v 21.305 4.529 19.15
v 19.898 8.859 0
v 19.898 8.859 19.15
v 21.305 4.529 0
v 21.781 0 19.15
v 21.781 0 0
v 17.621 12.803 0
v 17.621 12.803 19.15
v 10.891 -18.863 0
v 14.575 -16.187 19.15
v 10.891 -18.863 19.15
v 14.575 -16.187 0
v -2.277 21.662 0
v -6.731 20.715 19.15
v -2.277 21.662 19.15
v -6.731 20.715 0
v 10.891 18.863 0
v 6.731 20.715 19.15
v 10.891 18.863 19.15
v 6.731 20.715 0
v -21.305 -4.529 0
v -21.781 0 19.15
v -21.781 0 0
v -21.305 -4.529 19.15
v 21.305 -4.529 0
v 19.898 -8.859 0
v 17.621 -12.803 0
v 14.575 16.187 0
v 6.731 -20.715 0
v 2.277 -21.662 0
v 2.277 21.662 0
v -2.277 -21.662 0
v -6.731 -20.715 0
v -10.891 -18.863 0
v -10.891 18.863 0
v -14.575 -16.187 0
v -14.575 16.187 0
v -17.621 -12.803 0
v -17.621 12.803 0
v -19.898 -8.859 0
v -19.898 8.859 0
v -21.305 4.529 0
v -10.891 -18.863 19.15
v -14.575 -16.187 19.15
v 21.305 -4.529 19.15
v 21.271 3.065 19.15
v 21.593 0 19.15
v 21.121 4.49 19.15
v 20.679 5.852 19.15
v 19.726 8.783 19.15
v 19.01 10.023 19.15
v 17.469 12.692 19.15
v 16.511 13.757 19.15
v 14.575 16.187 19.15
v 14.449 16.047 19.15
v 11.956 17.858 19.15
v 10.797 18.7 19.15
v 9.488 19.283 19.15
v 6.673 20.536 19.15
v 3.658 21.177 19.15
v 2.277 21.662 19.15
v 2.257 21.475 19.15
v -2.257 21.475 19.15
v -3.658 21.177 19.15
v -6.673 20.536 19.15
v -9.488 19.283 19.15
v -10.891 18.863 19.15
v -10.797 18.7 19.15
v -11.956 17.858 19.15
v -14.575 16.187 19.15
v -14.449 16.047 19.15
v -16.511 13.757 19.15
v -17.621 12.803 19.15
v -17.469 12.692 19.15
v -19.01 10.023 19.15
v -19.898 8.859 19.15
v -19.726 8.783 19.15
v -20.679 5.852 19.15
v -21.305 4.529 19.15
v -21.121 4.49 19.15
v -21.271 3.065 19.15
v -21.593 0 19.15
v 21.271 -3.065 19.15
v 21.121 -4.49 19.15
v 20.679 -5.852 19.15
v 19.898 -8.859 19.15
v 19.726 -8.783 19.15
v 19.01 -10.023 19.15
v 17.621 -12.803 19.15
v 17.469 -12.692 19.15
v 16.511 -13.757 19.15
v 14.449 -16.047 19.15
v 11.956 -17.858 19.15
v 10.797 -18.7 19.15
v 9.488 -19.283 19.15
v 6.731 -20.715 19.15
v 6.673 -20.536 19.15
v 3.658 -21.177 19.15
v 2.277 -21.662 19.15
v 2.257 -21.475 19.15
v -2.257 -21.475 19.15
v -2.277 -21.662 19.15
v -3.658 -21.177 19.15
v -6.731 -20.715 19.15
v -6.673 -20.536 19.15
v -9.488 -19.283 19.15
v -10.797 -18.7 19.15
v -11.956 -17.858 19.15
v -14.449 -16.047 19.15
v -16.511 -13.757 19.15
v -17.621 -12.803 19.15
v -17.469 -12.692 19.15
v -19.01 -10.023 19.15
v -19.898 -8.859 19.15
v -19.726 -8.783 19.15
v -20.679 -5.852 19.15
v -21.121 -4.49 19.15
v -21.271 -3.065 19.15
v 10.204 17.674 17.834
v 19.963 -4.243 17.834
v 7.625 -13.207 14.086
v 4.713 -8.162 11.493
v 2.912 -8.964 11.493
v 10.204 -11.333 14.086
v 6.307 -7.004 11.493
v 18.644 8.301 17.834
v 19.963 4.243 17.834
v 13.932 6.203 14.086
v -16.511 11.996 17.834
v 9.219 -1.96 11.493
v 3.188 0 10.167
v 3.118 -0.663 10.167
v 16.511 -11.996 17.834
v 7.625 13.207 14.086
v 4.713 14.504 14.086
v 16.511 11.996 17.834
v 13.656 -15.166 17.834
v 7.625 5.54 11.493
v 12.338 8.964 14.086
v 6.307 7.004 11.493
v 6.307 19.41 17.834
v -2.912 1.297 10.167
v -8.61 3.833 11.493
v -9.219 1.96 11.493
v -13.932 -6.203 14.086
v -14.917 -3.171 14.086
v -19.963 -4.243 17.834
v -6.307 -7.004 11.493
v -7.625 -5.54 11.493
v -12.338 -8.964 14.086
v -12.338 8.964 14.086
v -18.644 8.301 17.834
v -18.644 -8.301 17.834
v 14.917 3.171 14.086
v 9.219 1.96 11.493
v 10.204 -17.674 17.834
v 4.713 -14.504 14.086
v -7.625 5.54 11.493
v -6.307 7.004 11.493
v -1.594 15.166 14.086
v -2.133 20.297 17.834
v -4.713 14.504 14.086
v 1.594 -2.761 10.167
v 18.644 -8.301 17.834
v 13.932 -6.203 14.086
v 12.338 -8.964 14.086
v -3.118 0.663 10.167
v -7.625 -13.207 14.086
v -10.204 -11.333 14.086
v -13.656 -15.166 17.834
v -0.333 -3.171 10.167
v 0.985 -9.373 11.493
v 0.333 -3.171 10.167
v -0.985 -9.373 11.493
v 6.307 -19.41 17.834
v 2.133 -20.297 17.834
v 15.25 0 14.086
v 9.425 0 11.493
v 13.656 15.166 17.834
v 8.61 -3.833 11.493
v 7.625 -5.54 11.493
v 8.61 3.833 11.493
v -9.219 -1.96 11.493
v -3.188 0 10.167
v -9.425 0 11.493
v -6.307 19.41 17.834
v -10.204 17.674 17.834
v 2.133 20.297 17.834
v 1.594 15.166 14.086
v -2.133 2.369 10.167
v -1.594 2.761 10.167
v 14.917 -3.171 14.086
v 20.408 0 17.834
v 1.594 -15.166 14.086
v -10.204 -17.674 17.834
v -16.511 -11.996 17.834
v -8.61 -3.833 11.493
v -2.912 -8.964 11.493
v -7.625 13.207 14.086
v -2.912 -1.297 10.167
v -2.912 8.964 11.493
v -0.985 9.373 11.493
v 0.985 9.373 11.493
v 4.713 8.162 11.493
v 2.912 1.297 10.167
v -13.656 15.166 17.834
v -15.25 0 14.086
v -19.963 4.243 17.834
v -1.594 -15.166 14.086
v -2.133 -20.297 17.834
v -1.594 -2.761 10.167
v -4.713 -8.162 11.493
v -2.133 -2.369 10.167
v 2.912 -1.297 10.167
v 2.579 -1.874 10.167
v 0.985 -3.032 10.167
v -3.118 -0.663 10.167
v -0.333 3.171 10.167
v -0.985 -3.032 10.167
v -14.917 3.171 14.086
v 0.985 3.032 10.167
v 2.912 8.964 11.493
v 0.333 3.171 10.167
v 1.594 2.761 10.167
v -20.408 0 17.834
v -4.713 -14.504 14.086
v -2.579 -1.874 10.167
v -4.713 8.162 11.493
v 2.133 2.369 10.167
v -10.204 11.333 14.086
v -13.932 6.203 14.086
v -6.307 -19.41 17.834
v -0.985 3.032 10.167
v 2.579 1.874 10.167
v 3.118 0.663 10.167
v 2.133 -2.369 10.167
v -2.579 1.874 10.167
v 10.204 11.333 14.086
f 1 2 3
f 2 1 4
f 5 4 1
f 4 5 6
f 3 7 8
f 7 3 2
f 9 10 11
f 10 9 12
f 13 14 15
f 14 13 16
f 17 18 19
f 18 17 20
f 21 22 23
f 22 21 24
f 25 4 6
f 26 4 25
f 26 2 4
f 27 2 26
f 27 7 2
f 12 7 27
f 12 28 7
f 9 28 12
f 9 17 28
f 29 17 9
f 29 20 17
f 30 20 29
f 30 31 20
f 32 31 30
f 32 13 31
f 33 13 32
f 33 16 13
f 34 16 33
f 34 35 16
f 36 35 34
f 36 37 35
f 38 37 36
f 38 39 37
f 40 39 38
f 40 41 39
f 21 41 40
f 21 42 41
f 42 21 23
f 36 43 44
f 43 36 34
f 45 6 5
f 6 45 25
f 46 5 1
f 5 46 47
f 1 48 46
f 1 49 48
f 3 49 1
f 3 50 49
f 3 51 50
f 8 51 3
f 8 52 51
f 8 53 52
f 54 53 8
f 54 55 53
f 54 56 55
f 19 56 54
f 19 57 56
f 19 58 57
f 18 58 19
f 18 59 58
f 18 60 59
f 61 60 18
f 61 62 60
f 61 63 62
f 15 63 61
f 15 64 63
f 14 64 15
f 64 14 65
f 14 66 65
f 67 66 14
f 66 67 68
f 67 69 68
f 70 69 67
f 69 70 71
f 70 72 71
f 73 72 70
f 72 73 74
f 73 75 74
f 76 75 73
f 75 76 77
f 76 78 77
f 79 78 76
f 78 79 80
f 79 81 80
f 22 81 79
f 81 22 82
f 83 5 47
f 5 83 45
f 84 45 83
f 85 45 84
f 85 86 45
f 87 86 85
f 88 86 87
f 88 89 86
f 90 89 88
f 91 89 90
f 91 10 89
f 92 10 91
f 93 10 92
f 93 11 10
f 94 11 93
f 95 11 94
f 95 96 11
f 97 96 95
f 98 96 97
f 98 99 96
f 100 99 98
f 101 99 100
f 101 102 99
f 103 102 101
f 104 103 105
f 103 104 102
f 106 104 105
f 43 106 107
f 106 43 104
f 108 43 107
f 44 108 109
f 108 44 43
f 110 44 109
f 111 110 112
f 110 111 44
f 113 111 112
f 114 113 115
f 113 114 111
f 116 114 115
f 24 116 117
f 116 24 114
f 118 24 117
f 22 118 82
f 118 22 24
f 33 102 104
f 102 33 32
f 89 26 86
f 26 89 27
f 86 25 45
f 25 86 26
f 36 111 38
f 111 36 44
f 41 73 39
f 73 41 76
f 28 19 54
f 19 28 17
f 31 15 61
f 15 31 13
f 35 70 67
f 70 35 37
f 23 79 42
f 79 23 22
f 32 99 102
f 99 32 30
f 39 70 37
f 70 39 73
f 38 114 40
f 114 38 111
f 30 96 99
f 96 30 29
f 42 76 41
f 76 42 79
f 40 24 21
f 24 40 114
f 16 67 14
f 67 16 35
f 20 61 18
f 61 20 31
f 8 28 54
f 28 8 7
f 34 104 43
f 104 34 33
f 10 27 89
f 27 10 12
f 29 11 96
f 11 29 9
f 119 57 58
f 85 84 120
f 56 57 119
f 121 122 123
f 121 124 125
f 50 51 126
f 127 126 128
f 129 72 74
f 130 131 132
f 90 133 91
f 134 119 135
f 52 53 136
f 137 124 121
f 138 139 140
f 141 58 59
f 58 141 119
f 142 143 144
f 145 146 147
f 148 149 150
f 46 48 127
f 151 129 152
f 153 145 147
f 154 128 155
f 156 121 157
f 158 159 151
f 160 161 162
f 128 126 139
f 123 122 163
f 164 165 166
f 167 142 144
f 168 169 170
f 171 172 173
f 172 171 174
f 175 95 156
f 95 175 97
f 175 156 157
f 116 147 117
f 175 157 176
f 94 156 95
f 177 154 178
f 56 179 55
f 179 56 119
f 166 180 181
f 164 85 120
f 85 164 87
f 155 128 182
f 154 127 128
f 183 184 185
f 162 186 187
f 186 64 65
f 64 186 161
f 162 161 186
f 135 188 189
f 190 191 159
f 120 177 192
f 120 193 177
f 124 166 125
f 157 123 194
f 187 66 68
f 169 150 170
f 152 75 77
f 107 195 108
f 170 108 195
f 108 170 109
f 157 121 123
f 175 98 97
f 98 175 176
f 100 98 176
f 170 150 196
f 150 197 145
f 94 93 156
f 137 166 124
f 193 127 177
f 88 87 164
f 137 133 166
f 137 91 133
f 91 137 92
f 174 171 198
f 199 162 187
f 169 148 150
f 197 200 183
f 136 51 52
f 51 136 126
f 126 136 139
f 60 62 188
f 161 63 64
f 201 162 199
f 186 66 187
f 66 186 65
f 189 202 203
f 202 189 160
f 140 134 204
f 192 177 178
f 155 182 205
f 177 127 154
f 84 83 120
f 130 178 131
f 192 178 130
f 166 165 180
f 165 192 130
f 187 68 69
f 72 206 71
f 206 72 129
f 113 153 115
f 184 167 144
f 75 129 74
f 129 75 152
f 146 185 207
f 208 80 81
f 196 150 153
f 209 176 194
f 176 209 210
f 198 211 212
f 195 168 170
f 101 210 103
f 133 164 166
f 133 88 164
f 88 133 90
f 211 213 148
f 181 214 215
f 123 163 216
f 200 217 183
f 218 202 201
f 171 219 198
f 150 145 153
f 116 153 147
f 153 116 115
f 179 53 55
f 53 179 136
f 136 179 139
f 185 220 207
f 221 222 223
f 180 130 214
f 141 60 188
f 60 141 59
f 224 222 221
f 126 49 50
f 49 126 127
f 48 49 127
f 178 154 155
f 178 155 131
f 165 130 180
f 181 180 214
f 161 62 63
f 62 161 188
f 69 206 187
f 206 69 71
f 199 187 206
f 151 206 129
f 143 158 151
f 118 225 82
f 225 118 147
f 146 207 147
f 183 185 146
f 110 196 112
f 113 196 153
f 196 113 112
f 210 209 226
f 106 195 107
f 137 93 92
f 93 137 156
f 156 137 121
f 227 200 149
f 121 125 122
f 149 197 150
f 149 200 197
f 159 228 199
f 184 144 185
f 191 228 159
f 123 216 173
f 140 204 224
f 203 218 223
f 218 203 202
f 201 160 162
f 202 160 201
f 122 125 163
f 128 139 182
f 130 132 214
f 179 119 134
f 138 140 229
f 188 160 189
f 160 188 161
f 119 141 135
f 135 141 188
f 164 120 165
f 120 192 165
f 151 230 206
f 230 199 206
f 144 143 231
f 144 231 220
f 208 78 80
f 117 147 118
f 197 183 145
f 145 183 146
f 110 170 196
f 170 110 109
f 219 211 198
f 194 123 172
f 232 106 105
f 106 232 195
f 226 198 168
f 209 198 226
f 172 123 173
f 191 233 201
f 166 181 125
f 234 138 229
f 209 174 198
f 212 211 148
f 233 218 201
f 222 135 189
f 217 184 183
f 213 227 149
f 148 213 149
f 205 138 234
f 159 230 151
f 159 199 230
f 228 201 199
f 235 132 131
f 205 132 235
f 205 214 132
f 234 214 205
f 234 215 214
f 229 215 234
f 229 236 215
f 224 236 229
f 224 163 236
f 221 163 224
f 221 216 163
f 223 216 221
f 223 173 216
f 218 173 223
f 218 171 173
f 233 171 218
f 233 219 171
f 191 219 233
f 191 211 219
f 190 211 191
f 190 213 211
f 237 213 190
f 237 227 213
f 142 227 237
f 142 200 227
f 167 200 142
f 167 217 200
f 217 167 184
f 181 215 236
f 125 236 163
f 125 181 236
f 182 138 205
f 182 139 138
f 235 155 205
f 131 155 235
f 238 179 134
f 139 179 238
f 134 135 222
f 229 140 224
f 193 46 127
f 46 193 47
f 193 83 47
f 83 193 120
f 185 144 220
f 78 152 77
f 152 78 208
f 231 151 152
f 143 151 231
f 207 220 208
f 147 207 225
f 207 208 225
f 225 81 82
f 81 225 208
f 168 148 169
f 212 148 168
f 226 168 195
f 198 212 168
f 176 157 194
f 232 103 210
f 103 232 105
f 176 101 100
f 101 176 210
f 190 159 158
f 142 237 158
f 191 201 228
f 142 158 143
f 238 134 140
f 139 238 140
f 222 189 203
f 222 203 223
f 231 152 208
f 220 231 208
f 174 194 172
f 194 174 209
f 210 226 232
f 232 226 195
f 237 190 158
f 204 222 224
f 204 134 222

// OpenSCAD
// simple stand for emmett's puzzle sphere

// radius of puzzle (mm)
radius=30;
// tolerance (mm)
tol=0.5;
// percent of sphere to sink into cylinder (%)
sink = 15; // [1:50]
// distance between bottom of puzzle and bottom of model (mm)
baseHeight = 10; 

r = radius+tol;
sphereCapRadius = sqrt((2*((r*sink)/50)*r)-pow(((r*sink)/50),2));

difference() {
    translate([0,0,baseHeight/2+((r*sink)/50)/2]) {
    cylinder(baseHeight+((r*sink)/50), sphereCapRadius, sphereCapRadius, true);
    }
    translate([0,0,r+baseHeight]) {
        sphere(r,true);
    }
}

translate([0,0,r+baseHeight]) {
        //sphere(r,true);  //uncomment to show sphere
}
